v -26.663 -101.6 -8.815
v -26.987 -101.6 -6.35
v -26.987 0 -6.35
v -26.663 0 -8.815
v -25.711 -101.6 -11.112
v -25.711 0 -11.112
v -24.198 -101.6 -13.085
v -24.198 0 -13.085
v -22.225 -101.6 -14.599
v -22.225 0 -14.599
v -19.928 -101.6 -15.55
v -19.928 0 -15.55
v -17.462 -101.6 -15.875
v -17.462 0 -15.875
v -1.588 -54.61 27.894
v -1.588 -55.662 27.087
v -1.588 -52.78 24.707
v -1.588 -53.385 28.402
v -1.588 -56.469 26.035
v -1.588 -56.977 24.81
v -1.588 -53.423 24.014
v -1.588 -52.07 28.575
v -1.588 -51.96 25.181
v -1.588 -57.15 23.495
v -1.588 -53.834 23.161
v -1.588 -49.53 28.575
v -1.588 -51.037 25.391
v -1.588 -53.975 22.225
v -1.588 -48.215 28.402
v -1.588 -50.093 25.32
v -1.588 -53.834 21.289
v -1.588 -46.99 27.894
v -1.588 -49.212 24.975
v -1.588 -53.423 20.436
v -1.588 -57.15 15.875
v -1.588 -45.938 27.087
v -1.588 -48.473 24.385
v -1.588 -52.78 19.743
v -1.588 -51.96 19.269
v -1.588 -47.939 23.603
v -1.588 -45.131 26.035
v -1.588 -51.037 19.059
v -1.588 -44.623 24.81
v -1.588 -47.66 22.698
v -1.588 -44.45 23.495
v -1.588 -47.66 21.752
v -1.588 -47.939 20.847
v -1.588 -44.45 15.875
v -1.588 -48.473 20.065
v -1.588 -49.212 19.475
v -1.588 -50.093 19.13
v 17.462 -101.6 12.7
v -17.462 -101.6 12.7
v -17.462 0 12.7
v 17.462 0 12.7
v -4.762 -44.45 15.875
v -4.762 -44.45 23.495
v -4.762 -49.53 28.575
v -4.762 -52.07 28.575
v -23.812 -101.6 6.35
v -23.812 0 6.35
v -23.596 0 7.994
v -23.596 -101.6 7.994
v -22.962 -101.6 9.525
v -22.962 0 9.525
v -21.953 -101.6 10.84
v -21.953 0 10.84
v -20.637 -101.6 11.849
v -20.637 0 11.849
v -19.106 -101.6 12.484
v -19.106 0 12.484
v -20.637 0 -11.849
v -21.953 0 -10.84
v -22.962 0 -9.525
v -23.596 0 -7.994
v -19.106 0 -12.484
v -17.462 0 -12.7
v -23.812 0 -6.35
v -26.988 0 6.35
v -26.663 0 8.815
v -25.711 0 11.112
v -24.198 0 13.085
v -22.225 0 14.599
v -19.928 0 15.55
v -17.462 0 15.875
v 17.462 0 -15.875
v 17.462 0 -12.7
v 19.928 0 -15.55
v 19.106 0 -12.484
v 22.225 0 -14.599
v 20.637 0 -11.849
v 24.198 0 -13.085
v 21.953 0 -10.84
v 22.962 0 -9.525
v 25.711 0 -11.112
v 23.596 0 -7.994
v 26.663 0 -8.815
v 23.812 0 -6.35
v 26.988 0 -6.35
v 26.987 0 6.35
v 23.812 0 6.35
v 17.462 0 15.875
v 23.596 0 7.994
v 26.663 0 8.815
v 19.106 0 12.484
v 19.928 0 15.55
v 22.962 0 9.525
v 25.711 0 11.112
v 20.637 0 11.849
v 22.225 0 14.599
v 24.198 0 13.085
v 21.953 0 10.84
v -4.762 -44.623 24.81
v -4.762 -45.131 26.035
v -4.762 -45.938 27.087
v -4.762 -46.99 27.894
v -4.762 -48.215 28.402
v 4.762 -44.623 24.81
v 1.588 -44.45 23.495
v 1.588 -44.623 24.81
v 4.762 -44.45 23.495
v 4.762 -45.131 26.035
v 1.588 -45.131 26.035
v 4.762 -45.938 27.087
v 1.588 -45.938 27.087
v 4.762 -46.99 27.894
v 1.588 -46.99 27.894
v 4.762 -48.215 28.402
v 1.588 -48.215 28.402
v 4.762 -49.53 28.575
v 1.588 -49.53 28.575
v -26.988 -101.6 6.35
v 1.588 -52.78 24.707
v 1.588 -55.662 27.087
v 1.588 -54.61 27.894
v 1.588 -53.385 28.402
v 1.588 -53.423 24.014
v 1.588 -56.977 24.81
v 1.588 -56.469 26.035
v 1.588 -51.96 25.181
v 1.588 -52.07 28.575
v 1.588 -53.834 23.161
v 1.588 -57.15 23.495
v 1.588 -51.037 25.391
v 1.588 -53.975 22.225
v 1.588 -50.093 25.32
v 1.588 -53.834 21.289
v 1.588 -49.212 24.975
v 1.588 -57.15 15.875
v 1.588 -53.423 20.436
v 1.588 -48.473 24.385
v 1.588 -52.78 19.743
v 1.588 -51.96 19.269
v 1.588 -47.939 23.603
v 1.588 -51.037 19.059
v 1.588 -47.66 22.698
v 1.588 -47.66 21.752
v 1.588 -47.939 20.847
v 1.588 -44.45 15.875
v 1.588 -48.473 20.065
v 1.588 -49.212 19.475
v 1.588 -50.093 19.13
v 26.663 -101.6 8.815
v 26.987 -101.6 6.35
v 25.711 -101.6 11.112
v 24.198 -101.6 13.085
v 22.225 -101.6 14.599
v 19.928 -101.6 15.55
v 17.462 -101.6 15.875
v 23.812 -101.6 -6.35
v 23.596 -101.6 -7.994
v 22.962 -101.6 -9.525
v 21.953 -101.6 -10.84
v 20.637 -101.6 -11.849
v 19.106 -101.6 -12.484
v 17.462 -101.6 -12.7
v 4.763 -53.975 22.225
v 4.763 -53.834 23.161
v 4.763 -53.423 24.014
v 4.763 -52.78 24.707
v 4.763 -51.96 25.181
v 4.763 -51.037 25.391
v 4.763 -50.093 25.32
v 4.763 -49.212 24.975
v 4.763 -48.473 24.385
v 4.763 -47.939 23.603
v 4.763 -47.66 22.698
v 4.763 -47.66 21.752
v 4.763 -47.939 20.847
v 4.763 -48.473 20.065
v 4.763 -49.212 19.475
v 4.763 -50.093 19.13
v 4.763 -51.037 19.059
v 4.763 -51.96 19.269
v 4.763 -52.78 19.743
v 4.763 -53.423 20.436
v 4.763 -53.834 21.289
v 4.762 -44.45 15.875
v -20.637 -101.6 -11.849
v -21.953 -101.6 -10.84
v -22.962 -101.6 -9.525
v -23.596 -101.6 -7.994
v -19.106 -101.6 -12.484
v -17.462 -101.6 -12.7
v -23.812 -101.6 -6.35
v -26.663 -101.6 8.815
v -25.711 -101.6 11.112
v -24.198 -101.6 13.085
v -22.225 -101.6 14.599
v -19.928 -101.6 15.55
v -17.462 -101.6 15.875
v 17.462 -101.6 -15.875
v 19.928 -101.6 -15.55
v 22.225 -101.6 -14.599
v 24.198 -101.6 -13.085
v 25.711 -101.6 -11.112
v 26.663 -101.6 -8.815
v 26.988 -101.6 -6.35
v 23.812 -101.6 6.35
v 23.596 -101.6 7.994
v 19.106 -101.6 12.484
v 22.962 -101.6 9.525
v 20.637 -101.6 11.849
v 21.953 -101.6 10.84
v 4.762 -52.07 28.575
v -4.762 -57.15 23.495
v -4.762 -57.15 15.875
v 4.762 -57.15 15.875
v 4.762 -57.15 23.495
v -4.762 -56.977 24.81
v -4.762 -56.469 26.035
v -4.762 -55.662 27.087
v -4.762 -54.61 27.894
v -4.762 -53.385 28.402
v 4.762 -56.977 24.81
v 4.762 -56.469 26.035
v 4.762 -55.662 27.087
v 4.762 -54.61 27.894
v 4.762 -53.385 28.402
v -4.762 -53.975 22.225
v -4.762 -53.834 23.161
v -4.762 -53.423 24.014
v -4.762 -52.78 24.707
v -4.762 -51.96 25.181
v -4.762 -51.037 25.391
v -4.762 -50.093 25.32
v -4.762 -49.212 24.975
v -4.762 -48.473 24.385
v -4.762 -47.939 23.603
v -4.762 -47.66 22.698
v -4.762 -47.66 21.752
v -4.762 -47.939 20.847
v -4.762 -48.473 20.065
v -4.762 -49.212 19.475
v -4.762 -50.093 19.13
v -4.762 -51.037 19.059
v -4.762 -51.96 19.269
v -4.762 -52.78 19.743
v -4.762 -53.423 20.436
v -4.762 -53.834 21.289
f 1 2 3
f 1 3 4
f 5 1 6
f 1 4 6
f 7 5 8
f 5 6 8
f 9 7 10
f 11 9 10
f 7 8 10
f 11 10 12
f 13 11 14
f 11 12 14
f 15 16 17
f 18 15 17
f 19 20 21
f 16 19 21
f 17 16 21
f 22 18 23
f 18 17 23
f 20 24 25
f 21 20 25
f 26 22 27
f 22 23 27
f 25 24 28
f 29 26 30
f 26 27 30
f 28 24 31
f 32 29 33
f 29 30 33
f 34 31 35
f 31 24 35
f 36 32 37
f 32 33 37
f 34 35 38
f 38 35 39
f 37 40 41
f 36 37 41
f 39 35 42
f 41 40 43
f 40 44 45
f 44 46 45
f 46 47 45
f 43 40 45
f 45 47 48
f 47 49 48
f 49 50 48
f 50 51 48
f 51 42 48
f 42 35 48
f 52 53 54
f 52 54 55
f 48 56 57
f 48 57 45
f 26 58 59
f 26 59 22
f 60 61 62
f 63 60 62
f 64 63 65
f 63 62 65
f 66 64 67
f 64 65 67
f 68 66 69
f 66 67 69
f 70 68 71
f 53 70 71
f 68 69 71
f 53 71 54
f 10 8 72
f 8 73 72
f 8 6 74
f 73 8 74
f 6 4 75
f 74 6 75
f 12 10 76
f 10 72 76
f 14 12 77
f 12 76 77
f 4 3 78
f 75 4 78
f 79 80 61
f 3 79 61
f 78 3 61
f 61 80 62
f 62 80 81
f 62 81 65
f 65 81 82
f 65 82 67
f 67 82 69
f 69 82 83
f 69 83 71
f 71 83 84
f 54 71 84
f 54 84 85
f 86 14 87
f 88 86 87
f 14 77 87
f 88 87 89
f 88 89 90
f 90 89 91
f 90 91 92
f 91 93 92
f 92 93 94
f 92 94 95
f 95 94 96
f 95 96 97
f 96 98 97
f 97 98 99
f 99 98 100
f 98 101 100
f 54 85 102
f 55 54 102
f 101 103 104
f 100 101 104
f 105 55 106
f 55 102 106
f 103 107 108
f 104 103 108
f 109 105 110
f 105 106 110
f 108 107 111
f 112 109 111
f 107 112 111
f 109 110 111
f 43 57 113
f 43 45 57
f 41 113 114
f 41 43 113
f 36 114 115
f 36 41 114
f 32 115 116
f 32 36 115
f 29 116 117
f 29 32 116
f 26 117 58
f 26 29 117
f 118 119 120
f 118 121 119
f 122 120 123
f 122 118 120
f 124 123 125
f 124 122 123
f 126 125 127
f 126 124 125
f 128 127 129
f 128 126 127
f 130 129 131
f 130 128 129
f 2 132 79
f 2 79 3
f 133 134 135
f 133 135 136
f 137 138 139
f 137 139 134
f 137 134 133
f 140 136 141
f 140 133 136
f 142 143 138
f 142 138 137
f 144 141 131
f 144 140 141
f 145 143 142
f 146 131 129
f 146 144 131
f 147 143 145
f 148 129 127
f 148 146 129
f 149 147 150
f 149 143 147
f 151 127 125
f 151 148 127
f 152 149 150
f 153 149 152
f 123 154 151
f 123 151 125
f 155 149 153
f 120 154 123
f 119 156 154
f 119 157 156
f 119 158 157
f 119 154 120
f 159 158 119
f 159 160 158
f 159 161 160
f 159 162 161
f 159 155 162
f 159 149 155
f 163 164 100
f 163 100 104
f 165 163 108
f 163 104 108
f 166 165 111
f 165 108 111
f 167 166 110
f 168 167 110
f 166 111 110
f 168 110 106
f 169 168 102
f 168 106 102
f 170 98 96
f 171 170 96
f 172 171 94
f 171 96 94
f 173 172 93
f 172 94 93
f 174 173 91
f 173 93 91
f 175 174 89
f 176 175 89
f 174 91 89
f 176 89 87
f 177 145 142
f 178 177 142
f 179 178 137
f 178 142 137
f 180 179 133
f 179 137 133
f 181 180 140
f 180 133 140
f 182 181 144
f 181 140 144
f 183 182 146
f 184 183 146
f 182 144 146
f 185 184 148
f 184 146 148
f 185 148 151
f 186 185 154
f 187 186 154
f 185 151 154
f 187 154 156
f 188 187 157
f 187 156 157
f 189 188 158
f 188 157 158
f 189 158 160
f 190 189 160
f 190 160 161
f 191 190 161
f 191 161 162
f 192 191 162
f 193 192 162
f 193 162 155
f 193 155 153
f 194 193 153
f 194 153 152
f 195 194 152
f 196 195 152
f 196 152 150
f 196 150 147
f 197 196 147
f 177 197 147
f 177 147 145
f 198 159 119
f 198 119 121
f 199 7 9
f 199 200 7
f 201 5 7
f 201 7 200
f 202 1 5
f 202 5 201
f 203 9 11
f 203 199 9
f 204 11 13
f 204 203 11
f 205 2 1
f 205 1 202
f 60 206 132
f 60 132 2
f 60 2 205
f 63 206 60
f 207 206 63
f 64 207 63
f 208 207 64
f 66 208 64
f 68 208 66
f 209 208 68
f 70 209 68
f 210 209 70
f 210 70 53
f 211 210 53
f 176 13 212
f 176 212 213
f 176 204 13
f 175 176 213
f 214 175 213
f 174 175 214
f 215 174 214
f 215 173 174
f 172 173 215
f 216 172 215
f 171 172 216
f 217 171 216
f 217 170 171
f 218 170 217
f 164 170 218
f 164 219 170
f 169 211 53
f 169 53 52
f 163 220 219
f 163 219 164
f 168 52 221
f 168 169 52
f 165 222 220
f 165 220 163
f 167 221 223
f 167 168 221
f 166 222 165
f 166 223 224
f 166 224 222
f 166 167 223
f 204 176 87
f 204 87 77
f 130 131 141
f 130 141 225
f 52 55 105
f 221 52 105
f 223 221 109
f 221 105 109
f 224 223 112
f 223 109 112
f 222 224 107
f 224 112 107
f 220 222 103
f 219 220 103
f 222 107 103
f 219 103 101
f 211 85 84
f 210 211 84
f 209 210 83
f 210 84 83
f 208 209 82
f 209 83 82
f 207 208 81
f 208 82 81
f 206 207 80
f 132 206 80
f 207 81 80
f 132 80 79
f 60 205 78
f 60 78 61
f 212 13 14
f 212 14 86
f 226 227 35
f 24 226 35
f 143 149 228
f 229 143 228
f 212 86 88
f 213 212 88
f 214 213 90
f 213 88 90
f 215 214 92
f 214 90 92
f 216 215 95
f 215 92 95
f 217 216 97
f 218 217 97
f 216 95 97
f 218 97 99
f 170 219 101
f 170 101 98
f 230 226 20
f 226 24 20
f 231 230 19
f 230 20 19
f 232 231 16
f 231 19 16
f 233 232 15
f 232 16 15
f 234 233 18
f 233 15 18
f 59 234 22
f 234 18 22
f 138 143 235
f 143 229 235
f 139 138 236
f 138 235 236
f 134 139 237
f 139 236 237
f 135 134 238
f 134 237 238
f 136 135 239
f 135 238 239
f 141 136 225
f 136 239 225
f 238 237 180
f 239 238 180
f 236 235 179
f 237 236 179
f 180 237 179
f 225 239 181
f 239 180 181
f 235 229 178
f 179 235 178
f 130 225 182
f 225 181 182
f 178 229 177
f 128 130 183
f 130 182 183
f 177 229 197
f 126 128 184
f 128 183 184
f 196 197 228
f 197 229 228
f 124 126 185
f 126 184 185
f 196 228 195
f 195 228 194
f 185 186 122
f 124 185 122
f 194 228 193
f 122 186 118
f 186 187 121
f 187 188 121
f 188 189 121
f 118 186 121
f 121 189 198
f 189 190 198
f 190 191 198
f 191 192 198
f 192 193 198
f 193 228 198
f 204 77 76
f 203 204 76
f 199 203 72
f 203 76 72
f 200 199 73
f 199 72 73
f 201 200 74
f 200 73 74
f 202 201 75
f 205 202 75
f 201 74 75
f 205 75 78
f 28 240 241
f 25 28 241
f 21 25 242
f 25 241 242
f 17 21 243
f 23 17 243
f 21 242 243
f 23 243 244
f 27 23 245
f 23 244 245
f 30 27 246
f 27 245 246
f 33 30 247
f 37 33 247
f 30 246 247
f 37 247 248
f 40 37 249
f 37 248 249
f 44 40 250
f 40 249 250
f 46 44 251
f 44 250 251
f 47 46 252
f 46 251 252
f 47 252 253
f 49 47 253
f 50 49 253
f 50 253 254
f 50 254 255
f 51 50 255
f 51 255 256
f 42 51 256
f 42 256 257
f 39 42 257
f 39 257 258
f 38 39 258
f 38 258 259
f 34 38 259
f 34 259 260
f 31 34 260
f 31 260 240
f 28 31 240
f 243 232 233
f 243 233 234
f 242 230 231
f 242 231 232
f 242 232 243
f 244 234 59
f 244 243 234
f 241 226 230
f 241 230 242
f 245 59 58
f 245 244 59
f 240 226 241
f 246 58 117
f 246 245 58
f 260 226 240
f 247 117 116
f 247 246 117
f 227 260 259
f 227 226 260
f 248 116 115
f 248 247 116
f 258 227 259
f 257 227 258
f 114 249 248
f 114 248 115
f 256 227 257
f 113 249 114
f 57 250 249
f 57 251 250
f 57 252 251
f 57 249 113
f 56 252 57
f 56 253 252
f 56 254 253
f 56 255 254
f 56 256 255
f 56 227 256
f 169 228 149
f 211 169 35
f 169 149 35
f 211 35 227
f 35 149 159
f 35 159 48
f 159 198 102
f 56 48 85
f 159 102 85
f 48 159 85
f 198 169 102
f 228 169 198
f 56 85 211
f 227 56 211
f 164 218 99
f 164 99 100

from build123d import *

# Parameters (mm, degrees)
F1_DEPTH = 101.6
F2_W     = 3.175
F2_H     = 12.7
F3_DEPTH = 12.7
F5_D     = 6.35
F6_R     = 5.08


with BuildPart() as f1:
    # F0 (on Front) → F1 (new body)
    with BuildSketch(Plane.XZ):
        with BuildLine():
            Line((17.4625, 15.875), (-17.4625, 15.875))
            ThreePointArc((-17.4625, 15.875), (-24.197692, 13.085192), (-26.9875, 6.35))
            Line((-26.9875, 6.35), (-26.9875, -6.35))
            ThreePointArc((-26.9875, -6.35), (-24.197692, -13.085192), (-17.4625, -15.875))
            Line((-17.4625, -15.875), (17.4625, -15.875))
            ThreePointArc((17.4625, -15.875), (24.197692, -13.085192), (26.9875, -6.35))
            Line((26.9875, -6.35), (26.9875, 6.35))
            ThreePointArc((26.9875, 6.35), (24.197692, 13.085192), (17.4625, 15.875))
        make_face()
        with BuildLine():
            ThreePointArc((-23.8125, 6.35), (-21.952628, 10.840128), (-17.4625, 12.7))
            Line((-17.4625, 12.7), (17.4625, 12.7))
            ThreePointArc((17.4625, 12.7), (21.952628, 10.840128), (23.8125, 6.35))
            Line((23.8125, 6.35), (23.8125, -6.35))
            ThreePointArc((23.8125, -6.35), (21.952628, -10.840128), (17.4625, -12.7))
            Line((17.4625, -12.7), (-17.4625, -12.7))
            ThreePointArc((-17.4625, -12.7), (-21.952628, -10.840128), (-23.8125, -6.35))
            Line((-23.8125, -6.35), (-23.8125, 6.35))
        make_face(mode=Mode.SUBTRACT)
    extrude(amount=F1_DEPTH)

    # F2 (on face) → F3 (join)
    with BuildSketch(Plane.XY.offset(15.875)):
        with Locations((-3.175, -50.8)):
            Rectangle(F2_W, F2_H)
        with Locations((3.175, -50.8)):
            Rectangle(F2_W, F2_H)
    extrude(amount=F3_DEPTH)

    # F5 (through all)
    with Locations(Plane.YZ.offset(4.7625)):
        with Locations((-50.8, 22.225)):
            Hole(F5_D / 2)

    # F6
    f6_edges = [f1.edges().sort_by_distance(p)[0] for p in [
        (-3.175, -57.15, 28.575),
        (3.175, -57.15, 28.575),
        (3.175, -44.45, 28.575),
        (-3.175, -44.45, 28.575),
    ]]
    fillet(f6_edges, radius=F6_R)


solid = f1.part
